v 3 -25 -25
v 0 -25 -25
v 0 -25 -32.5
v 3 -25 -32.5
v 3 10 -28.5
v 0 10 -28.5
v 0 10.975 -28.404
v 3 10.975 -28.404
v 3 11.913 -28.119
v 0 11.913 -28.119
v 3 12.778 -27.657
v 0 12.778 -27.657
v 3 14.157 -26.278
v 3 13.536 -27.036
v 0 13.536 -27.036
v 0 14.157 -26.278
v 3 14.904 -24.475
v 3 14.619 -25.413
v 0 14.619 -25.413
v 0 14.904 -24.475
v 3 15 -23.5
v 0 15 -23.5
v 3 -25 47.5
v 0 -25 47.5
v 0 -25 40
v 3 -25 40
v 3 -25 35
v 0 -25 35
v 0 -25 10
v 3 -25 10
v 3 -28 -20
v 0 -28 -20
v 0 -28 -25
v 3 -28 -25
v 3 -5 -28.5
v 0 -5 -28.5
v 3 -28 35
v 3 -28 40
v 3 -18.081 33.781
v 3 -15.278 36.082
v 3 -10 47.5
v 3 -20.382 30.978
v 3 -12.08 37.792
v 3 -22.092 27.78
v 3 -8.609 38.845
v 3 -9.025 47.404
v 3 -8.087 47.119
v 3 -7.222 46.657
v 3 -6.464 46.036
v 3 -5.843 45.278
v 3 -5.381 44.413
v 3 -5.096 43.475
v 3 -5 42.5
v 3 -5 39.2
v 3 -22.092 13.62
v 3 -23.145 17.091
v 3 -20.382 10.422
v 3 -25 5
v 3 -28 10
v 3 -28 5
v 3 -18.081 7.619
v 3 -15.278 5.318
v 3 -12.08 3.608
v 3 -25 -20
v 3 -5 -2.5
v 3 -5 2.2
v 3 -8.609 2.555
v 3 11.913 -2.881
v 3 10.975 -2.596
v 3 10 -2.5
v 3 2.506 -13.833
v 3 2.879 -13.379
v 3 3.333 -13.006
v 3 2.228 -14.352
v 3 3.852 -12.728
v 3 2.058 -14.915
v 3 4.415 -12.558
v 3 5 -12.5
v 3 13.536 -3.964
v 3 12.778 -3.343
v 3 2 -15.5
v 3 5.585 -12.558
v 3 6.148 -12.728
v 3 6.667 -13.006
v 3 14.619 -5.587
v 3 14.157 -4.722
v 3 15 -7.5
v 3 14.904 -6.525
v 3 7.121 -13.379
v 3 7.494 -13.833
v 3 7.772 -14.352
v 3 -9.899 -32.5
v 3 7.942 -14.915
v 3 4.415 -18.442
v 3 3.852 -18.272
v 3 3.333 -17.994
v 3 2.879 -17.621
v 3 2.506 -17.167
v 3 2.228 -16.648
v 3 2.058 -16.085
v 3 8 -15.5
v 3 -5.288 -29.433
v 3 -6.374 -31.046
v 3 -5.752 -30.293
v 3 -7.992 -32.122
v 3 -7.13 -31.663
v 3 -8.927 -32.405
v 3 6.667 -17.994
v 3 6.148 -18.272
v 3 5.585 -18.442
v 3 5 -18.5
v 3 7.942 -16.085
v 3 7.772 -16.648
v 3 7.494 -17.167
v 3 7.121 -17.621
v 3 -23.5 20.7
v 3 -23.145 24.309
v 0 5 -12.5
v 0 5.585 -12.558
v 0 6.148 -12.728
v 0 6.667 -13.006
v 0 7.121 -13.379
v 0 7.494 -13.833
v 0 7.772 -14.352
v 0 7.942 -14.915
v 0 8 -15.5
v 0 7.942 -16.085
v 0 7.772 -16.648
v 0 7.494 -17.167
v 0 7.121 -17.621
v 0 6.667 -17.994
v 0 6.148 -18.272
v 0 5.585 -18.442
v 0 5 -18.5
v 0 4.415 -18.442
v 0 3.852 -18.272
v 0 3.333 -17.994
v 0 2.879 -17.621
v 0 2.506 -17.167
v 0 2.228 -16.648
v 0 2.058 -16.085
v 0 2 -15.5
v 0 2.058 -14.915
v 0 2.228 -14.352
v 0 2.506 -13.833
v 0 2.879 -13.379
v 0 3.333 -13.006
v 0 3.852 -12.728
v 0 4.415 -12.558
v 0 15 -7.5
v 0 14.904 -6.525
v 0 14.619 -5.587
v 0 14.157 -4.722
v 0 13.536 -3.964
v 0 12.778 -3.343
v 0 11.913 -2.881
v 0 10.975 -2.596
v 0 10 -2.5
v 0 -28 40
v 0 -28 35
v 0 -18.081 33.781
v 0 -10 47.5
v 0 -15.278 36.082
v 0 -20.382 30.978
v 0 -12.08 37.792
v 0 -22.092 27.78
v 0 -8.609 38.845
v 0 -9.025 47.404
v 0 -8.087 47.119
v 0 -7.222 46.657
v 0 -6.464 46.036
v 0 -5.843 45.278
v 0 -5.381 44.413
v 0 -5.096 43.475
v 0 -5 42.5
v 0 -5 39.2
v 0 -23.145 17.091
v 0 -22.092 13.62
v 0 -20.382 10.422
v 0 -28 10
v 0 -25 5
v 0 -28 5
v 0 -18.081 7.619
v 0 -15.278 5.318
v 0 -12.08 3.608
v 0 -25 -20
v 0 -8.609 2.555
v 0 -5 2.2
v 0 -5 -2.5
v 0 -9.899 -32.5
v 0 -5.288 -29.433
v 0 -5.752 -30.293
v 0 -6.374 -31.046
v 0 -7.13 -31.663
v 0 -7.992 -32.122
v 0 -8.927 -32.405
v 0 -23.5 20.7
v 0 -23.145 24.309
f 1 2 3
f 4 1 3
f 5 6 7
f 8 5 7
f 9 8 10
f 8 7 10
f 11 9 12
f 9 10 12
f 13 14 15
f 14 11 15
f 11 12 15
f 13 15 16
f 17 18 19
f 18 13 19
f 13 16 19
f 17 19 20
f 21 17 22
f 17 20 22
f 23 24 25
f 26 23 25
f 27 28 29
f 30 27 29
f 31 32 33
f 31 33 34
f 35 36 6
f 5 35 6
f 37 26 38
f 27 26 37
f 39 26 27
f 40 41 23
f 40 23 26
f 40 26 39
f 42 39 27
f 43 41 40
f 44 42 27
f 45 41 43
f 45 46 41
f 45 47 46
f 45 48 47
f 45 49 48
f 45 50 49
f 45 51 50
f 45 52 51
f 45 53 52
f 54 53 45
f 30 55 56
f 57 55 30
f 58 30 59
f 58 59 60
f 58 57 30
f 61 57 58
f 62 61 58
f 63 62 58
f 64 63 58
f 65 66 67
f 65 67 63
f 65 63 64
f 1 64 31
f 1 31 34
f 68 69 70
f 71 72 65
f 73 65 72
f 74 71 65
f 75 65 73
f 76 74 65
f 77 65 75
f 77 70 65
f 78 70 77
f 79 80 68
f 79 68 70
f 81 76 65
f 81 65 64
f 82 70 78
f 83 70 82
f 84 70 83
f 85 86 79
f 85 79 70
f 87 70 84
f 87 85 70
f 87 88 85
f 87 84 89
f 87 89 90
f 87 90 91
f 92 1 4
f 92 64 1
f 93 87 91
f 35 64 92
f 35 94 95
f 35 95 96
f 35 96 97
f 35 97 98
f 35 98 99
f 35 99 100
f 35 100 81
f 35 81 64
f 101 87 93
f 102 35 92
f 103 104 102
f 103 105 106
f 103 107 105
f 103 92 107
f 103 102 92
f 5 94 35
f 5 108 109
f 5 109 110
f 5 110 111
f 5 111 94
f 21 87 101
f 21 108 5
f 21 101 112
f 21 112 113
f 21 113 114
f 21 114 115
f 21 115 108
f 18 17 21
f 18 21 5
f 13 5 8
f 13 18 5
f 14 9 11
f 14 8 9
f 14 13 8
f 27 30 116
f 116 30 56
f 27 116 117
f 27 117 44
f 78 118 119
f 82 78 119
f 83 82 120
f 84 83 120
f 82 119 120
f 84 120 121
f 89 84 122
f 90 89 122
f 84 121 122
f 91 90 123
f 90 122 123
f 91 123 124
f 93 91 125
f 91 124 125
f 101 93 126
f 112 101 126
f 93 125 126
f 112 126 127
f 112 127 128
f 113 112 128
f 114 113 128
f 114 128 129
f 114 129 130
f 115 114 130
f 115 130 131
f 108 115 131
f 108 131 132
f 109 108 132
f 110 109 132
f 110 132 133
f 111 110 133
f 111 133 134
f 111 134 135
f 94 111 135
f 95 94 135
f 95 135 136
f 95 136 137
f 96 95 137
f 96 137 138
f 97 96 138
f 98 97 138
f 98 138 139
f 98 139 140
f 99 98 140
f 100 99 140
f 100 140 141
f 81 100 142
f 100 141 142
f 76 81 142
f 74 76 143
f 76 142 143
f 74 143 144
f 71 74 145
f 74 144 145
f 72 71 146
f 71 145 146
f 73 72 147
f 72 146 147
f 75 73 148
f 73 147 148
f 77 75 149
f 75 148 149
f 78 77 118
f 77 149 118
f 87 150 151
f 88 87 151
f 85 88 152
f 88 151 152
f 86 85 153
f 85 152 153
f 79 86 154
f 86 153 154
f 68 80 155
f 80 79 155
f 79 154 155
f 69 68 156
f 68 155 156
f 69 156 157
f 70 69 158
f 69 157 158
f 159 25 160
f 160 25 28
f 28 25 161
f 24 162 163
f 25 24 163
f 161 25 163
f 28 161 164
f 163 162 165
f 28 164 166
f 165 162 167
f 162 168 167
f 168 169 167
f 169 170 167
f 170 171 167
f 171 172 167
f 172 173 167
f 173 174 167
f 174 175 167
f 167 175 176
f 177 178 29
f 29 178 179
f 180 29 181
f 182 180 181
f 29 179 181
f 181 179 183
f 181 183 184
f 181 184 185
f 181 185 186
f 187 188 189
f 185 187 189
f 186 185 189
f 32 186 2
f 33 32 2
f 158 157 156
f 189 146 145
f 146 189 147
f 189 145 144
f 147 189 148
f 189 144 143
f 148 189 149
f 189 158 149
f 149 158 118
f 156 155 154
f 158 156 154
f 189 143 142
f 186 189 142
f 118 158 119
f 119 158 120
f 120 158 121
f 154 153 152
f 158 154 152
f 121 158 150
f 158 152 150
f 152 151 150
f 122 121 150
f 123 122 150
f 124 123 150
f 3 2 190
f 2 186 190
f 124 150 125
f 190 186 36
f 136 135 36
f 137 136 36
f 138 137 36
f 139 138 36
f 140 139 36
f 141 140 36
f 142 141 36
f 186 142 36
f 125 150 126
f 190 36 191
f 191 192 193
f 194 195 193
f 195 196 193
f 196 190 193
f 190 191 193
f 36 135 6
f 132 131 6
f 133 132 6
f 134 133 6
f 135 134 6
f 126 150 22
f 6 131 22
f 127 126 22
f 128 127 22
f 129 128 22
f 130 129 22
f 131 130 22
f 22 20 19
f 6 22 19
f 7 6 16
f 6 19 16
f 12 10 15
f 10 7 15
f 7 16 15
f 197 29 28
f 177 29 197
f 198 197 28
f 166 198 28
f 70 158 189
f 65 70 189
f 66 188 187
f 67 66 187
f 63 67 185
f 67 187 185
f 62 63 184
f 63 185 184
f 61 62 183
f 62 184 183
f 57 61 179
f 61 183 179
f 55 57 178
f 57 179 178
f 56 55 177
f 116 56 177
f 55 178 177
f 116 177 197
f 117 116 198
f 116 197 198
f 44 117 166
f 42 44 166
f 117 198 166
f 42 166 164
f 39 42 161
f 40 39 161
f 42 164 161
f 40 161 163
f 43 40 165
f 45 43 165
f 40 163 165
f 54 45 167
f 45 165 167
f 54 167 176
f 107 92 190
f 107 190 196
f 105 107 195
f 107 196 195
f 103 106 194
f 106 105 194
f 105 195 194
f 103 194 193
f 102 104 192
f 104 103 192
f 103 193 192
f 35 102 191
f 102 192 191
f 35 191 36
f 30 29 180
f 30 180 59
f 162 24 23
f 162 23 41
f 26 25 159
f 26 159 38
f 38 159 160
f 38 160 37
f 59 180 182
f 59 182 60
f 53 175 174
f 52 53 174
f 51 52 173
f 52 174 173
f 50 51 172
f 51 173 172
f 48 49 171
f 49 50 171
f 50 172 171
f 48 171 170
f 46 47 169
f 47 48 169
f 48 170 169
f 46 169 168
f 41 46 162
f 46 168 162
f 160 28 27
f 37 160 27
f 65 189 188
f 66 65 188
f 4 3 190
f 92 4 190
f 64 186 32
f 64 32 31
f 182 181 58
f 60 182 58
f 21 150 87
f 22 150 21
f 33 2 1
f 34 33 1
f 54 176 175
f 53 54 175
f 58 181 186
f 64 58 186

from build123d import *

# Parameters (mm, degrees)
SKETCH1_W           = 80
SKETCH1_H           = 40
BOSS_EXTRUDE1_DEPTH = 3
SKETCH8_R           = 3
SKETCH8_W           = 4
SKETCH8_H           = 20
CUT_EXTRUDE4_DEPTH  = 54.761045377
FILLET1_R           = 5
SKETCH3_W           = 3
SKETCH3_H           = 5
BOSS_EXTRUDE2_DEPTH = 3
LPATTERN1_COUNT     = 3
LPATTERN1_PITCH     = 30


with BuildPart() as part:
    # Sketch1 → Boss-Extrude1 (new body)
    with BuildSketch(Plane(origin=(0, 0, 0), x_dir=(0, 0, -1), z_dir=(1, 0, 0))):
        with Locations((-7.5, -5)):
            Rectangle(SKETCH1_W, SKETCH1_H)
    extrude(amount=BOSS_EXTRUDE1_DEPTH)

    # Sketch8 → Cut-Extrude4 (cut, through all)
    with BuildSketch(Plane.ZY):
        with Locations((-15.5, 5)):
            Circle(SKETCH8_R)
        with BuildLine():
            Line((39.2, -5), (47.5, -5))
            Line((47.5, -5), (47.5, 15))
            Line((47.5, 15), (39.2, 15))
            Line((39.2, 15), (2.2, 15))
            Line((2.2, 15), (-2.5, 15))
            Line((-2.5, 15), (-2.5, -5))
            Line((-2.5, -5), (2.2, -5))
            ThreePointArc((2.2, -5), (20.7, -23.5), (39.2, -5))
        make_face()
        with Locations((-30.5, 5)):
            Rectangle(SKETCH8_W, SKETCH8_H)
    extrude(amount=-CUT_EXTRUDE4_DEPTH, mode=Mode.SUBTRACT)

    # Fillet1
    # the kernel refuses this fillet: 5 mm, written as the material it takes off along each edge
    with BuildSketch(Plane(origin=(-12.5, -5, 47.5), x_dir=(0, -1, 0), z_dir=(1, 0, 0)), Plane(origin=(-12.5, 15, -28.5), x_dir=(0, 0, 1), z_dir=(1, 0, 0))) as fillet1_piece_1:
        with BuildLine():
            CenterArc((FILLET1_R, FILLET1_R), FILLET1_R, 180, 90)
            Line((0, FILLET1_R), (-FILLET1_R * 0.02, FILLET1_R))
            Line((-FILLET1_R * 0.02, FILLET1_R), (-FILLET1_R * 0.02, -FILLET1_R * 0.02))
            Line((-FILLET1_R * 0.02, -FILLET1_R * 0.02), (FILLET1_R, -FILLET1_R * 0.02))
            Line((FILLET1_R, -FILLET1_R * 0.02), (FILLET1_R, 0))
        make_face()
    extrude(amount=28, mode=Mode.SUBTRACT)
    with BuildSketch(Plane(origin=(-12.5, 15, -2.5), x_dir=(0, 0, -1), z_dir=(1, 0, 0))) as fillet1_piece_2:
        with BuildLine():
            CenterArc((FILLET1_R, -FILLET1_R), FILLET1_R, 90, 90)
            Line((0, -FILLET1_R), (-FILLET1_R * 0.02, -FILLET1_R))
            Line((-FILLET1_R * 0.02, -FILLET1_R), (-FILLET1_R * 0.02, FILLET1_R * 0.02))
            Line((-FILLET1_R * 0.02, FILLET1_R * 0.02), (FILLET1_R, FILLET1_R * 0.02))
            Line((FILLET1_R, FILLET1_R * 0.02), (FILLET1_R, 0))
        make_face()
    extrude(amount=28, mode=Mode.SUBTRACT)
    with BuildSketch(Plane(origin=(-12.247448714, -5, -32.5), x_dir=(0, -1.5645262863012704e-12, 1.0), z_dir=(1, 0, 0))) as fillet1_piece_3:
        with BuildLine():
            CenterArc((5, 4.898979486), FILLET1_R, 180, 78.463040967)
            Line((0, 4.898979486), (-0.1, 4.898979486))
            Line((-0.1, 4.898979486), (-0.1, 0))
            Line((-0.1, 0), (0, -0.1))
            ThreePointArc((0, -0.1), (2, -0.1), (3.98, -0.09797959))
            Line((3.98, -0.09797959), (4, 0))
        make_face()
    extrude(amount=27.494897428, mode=Mode.SUBTRACT)

    # Sketch3 → Boss-Extrude2 (add)
    with BuildSketch(Plane.XZ.offset(25)):
        with Locations((1.5, 37.5)):
            Rectangle(SKETCH3_W, SKETCH3_H)
    boss_extrude2 = extrude(amount=BOSS_EXTRUDE2_DEPTH)

    # LPattern1: Boss-Extrude2 ×3
    with Locations(*[(0, 0, -i * LPATTERN1_PITCH) for i in range(1, LPATTERN1_COUNT)]):
        add(boss_extrude2)


solid = part.part
